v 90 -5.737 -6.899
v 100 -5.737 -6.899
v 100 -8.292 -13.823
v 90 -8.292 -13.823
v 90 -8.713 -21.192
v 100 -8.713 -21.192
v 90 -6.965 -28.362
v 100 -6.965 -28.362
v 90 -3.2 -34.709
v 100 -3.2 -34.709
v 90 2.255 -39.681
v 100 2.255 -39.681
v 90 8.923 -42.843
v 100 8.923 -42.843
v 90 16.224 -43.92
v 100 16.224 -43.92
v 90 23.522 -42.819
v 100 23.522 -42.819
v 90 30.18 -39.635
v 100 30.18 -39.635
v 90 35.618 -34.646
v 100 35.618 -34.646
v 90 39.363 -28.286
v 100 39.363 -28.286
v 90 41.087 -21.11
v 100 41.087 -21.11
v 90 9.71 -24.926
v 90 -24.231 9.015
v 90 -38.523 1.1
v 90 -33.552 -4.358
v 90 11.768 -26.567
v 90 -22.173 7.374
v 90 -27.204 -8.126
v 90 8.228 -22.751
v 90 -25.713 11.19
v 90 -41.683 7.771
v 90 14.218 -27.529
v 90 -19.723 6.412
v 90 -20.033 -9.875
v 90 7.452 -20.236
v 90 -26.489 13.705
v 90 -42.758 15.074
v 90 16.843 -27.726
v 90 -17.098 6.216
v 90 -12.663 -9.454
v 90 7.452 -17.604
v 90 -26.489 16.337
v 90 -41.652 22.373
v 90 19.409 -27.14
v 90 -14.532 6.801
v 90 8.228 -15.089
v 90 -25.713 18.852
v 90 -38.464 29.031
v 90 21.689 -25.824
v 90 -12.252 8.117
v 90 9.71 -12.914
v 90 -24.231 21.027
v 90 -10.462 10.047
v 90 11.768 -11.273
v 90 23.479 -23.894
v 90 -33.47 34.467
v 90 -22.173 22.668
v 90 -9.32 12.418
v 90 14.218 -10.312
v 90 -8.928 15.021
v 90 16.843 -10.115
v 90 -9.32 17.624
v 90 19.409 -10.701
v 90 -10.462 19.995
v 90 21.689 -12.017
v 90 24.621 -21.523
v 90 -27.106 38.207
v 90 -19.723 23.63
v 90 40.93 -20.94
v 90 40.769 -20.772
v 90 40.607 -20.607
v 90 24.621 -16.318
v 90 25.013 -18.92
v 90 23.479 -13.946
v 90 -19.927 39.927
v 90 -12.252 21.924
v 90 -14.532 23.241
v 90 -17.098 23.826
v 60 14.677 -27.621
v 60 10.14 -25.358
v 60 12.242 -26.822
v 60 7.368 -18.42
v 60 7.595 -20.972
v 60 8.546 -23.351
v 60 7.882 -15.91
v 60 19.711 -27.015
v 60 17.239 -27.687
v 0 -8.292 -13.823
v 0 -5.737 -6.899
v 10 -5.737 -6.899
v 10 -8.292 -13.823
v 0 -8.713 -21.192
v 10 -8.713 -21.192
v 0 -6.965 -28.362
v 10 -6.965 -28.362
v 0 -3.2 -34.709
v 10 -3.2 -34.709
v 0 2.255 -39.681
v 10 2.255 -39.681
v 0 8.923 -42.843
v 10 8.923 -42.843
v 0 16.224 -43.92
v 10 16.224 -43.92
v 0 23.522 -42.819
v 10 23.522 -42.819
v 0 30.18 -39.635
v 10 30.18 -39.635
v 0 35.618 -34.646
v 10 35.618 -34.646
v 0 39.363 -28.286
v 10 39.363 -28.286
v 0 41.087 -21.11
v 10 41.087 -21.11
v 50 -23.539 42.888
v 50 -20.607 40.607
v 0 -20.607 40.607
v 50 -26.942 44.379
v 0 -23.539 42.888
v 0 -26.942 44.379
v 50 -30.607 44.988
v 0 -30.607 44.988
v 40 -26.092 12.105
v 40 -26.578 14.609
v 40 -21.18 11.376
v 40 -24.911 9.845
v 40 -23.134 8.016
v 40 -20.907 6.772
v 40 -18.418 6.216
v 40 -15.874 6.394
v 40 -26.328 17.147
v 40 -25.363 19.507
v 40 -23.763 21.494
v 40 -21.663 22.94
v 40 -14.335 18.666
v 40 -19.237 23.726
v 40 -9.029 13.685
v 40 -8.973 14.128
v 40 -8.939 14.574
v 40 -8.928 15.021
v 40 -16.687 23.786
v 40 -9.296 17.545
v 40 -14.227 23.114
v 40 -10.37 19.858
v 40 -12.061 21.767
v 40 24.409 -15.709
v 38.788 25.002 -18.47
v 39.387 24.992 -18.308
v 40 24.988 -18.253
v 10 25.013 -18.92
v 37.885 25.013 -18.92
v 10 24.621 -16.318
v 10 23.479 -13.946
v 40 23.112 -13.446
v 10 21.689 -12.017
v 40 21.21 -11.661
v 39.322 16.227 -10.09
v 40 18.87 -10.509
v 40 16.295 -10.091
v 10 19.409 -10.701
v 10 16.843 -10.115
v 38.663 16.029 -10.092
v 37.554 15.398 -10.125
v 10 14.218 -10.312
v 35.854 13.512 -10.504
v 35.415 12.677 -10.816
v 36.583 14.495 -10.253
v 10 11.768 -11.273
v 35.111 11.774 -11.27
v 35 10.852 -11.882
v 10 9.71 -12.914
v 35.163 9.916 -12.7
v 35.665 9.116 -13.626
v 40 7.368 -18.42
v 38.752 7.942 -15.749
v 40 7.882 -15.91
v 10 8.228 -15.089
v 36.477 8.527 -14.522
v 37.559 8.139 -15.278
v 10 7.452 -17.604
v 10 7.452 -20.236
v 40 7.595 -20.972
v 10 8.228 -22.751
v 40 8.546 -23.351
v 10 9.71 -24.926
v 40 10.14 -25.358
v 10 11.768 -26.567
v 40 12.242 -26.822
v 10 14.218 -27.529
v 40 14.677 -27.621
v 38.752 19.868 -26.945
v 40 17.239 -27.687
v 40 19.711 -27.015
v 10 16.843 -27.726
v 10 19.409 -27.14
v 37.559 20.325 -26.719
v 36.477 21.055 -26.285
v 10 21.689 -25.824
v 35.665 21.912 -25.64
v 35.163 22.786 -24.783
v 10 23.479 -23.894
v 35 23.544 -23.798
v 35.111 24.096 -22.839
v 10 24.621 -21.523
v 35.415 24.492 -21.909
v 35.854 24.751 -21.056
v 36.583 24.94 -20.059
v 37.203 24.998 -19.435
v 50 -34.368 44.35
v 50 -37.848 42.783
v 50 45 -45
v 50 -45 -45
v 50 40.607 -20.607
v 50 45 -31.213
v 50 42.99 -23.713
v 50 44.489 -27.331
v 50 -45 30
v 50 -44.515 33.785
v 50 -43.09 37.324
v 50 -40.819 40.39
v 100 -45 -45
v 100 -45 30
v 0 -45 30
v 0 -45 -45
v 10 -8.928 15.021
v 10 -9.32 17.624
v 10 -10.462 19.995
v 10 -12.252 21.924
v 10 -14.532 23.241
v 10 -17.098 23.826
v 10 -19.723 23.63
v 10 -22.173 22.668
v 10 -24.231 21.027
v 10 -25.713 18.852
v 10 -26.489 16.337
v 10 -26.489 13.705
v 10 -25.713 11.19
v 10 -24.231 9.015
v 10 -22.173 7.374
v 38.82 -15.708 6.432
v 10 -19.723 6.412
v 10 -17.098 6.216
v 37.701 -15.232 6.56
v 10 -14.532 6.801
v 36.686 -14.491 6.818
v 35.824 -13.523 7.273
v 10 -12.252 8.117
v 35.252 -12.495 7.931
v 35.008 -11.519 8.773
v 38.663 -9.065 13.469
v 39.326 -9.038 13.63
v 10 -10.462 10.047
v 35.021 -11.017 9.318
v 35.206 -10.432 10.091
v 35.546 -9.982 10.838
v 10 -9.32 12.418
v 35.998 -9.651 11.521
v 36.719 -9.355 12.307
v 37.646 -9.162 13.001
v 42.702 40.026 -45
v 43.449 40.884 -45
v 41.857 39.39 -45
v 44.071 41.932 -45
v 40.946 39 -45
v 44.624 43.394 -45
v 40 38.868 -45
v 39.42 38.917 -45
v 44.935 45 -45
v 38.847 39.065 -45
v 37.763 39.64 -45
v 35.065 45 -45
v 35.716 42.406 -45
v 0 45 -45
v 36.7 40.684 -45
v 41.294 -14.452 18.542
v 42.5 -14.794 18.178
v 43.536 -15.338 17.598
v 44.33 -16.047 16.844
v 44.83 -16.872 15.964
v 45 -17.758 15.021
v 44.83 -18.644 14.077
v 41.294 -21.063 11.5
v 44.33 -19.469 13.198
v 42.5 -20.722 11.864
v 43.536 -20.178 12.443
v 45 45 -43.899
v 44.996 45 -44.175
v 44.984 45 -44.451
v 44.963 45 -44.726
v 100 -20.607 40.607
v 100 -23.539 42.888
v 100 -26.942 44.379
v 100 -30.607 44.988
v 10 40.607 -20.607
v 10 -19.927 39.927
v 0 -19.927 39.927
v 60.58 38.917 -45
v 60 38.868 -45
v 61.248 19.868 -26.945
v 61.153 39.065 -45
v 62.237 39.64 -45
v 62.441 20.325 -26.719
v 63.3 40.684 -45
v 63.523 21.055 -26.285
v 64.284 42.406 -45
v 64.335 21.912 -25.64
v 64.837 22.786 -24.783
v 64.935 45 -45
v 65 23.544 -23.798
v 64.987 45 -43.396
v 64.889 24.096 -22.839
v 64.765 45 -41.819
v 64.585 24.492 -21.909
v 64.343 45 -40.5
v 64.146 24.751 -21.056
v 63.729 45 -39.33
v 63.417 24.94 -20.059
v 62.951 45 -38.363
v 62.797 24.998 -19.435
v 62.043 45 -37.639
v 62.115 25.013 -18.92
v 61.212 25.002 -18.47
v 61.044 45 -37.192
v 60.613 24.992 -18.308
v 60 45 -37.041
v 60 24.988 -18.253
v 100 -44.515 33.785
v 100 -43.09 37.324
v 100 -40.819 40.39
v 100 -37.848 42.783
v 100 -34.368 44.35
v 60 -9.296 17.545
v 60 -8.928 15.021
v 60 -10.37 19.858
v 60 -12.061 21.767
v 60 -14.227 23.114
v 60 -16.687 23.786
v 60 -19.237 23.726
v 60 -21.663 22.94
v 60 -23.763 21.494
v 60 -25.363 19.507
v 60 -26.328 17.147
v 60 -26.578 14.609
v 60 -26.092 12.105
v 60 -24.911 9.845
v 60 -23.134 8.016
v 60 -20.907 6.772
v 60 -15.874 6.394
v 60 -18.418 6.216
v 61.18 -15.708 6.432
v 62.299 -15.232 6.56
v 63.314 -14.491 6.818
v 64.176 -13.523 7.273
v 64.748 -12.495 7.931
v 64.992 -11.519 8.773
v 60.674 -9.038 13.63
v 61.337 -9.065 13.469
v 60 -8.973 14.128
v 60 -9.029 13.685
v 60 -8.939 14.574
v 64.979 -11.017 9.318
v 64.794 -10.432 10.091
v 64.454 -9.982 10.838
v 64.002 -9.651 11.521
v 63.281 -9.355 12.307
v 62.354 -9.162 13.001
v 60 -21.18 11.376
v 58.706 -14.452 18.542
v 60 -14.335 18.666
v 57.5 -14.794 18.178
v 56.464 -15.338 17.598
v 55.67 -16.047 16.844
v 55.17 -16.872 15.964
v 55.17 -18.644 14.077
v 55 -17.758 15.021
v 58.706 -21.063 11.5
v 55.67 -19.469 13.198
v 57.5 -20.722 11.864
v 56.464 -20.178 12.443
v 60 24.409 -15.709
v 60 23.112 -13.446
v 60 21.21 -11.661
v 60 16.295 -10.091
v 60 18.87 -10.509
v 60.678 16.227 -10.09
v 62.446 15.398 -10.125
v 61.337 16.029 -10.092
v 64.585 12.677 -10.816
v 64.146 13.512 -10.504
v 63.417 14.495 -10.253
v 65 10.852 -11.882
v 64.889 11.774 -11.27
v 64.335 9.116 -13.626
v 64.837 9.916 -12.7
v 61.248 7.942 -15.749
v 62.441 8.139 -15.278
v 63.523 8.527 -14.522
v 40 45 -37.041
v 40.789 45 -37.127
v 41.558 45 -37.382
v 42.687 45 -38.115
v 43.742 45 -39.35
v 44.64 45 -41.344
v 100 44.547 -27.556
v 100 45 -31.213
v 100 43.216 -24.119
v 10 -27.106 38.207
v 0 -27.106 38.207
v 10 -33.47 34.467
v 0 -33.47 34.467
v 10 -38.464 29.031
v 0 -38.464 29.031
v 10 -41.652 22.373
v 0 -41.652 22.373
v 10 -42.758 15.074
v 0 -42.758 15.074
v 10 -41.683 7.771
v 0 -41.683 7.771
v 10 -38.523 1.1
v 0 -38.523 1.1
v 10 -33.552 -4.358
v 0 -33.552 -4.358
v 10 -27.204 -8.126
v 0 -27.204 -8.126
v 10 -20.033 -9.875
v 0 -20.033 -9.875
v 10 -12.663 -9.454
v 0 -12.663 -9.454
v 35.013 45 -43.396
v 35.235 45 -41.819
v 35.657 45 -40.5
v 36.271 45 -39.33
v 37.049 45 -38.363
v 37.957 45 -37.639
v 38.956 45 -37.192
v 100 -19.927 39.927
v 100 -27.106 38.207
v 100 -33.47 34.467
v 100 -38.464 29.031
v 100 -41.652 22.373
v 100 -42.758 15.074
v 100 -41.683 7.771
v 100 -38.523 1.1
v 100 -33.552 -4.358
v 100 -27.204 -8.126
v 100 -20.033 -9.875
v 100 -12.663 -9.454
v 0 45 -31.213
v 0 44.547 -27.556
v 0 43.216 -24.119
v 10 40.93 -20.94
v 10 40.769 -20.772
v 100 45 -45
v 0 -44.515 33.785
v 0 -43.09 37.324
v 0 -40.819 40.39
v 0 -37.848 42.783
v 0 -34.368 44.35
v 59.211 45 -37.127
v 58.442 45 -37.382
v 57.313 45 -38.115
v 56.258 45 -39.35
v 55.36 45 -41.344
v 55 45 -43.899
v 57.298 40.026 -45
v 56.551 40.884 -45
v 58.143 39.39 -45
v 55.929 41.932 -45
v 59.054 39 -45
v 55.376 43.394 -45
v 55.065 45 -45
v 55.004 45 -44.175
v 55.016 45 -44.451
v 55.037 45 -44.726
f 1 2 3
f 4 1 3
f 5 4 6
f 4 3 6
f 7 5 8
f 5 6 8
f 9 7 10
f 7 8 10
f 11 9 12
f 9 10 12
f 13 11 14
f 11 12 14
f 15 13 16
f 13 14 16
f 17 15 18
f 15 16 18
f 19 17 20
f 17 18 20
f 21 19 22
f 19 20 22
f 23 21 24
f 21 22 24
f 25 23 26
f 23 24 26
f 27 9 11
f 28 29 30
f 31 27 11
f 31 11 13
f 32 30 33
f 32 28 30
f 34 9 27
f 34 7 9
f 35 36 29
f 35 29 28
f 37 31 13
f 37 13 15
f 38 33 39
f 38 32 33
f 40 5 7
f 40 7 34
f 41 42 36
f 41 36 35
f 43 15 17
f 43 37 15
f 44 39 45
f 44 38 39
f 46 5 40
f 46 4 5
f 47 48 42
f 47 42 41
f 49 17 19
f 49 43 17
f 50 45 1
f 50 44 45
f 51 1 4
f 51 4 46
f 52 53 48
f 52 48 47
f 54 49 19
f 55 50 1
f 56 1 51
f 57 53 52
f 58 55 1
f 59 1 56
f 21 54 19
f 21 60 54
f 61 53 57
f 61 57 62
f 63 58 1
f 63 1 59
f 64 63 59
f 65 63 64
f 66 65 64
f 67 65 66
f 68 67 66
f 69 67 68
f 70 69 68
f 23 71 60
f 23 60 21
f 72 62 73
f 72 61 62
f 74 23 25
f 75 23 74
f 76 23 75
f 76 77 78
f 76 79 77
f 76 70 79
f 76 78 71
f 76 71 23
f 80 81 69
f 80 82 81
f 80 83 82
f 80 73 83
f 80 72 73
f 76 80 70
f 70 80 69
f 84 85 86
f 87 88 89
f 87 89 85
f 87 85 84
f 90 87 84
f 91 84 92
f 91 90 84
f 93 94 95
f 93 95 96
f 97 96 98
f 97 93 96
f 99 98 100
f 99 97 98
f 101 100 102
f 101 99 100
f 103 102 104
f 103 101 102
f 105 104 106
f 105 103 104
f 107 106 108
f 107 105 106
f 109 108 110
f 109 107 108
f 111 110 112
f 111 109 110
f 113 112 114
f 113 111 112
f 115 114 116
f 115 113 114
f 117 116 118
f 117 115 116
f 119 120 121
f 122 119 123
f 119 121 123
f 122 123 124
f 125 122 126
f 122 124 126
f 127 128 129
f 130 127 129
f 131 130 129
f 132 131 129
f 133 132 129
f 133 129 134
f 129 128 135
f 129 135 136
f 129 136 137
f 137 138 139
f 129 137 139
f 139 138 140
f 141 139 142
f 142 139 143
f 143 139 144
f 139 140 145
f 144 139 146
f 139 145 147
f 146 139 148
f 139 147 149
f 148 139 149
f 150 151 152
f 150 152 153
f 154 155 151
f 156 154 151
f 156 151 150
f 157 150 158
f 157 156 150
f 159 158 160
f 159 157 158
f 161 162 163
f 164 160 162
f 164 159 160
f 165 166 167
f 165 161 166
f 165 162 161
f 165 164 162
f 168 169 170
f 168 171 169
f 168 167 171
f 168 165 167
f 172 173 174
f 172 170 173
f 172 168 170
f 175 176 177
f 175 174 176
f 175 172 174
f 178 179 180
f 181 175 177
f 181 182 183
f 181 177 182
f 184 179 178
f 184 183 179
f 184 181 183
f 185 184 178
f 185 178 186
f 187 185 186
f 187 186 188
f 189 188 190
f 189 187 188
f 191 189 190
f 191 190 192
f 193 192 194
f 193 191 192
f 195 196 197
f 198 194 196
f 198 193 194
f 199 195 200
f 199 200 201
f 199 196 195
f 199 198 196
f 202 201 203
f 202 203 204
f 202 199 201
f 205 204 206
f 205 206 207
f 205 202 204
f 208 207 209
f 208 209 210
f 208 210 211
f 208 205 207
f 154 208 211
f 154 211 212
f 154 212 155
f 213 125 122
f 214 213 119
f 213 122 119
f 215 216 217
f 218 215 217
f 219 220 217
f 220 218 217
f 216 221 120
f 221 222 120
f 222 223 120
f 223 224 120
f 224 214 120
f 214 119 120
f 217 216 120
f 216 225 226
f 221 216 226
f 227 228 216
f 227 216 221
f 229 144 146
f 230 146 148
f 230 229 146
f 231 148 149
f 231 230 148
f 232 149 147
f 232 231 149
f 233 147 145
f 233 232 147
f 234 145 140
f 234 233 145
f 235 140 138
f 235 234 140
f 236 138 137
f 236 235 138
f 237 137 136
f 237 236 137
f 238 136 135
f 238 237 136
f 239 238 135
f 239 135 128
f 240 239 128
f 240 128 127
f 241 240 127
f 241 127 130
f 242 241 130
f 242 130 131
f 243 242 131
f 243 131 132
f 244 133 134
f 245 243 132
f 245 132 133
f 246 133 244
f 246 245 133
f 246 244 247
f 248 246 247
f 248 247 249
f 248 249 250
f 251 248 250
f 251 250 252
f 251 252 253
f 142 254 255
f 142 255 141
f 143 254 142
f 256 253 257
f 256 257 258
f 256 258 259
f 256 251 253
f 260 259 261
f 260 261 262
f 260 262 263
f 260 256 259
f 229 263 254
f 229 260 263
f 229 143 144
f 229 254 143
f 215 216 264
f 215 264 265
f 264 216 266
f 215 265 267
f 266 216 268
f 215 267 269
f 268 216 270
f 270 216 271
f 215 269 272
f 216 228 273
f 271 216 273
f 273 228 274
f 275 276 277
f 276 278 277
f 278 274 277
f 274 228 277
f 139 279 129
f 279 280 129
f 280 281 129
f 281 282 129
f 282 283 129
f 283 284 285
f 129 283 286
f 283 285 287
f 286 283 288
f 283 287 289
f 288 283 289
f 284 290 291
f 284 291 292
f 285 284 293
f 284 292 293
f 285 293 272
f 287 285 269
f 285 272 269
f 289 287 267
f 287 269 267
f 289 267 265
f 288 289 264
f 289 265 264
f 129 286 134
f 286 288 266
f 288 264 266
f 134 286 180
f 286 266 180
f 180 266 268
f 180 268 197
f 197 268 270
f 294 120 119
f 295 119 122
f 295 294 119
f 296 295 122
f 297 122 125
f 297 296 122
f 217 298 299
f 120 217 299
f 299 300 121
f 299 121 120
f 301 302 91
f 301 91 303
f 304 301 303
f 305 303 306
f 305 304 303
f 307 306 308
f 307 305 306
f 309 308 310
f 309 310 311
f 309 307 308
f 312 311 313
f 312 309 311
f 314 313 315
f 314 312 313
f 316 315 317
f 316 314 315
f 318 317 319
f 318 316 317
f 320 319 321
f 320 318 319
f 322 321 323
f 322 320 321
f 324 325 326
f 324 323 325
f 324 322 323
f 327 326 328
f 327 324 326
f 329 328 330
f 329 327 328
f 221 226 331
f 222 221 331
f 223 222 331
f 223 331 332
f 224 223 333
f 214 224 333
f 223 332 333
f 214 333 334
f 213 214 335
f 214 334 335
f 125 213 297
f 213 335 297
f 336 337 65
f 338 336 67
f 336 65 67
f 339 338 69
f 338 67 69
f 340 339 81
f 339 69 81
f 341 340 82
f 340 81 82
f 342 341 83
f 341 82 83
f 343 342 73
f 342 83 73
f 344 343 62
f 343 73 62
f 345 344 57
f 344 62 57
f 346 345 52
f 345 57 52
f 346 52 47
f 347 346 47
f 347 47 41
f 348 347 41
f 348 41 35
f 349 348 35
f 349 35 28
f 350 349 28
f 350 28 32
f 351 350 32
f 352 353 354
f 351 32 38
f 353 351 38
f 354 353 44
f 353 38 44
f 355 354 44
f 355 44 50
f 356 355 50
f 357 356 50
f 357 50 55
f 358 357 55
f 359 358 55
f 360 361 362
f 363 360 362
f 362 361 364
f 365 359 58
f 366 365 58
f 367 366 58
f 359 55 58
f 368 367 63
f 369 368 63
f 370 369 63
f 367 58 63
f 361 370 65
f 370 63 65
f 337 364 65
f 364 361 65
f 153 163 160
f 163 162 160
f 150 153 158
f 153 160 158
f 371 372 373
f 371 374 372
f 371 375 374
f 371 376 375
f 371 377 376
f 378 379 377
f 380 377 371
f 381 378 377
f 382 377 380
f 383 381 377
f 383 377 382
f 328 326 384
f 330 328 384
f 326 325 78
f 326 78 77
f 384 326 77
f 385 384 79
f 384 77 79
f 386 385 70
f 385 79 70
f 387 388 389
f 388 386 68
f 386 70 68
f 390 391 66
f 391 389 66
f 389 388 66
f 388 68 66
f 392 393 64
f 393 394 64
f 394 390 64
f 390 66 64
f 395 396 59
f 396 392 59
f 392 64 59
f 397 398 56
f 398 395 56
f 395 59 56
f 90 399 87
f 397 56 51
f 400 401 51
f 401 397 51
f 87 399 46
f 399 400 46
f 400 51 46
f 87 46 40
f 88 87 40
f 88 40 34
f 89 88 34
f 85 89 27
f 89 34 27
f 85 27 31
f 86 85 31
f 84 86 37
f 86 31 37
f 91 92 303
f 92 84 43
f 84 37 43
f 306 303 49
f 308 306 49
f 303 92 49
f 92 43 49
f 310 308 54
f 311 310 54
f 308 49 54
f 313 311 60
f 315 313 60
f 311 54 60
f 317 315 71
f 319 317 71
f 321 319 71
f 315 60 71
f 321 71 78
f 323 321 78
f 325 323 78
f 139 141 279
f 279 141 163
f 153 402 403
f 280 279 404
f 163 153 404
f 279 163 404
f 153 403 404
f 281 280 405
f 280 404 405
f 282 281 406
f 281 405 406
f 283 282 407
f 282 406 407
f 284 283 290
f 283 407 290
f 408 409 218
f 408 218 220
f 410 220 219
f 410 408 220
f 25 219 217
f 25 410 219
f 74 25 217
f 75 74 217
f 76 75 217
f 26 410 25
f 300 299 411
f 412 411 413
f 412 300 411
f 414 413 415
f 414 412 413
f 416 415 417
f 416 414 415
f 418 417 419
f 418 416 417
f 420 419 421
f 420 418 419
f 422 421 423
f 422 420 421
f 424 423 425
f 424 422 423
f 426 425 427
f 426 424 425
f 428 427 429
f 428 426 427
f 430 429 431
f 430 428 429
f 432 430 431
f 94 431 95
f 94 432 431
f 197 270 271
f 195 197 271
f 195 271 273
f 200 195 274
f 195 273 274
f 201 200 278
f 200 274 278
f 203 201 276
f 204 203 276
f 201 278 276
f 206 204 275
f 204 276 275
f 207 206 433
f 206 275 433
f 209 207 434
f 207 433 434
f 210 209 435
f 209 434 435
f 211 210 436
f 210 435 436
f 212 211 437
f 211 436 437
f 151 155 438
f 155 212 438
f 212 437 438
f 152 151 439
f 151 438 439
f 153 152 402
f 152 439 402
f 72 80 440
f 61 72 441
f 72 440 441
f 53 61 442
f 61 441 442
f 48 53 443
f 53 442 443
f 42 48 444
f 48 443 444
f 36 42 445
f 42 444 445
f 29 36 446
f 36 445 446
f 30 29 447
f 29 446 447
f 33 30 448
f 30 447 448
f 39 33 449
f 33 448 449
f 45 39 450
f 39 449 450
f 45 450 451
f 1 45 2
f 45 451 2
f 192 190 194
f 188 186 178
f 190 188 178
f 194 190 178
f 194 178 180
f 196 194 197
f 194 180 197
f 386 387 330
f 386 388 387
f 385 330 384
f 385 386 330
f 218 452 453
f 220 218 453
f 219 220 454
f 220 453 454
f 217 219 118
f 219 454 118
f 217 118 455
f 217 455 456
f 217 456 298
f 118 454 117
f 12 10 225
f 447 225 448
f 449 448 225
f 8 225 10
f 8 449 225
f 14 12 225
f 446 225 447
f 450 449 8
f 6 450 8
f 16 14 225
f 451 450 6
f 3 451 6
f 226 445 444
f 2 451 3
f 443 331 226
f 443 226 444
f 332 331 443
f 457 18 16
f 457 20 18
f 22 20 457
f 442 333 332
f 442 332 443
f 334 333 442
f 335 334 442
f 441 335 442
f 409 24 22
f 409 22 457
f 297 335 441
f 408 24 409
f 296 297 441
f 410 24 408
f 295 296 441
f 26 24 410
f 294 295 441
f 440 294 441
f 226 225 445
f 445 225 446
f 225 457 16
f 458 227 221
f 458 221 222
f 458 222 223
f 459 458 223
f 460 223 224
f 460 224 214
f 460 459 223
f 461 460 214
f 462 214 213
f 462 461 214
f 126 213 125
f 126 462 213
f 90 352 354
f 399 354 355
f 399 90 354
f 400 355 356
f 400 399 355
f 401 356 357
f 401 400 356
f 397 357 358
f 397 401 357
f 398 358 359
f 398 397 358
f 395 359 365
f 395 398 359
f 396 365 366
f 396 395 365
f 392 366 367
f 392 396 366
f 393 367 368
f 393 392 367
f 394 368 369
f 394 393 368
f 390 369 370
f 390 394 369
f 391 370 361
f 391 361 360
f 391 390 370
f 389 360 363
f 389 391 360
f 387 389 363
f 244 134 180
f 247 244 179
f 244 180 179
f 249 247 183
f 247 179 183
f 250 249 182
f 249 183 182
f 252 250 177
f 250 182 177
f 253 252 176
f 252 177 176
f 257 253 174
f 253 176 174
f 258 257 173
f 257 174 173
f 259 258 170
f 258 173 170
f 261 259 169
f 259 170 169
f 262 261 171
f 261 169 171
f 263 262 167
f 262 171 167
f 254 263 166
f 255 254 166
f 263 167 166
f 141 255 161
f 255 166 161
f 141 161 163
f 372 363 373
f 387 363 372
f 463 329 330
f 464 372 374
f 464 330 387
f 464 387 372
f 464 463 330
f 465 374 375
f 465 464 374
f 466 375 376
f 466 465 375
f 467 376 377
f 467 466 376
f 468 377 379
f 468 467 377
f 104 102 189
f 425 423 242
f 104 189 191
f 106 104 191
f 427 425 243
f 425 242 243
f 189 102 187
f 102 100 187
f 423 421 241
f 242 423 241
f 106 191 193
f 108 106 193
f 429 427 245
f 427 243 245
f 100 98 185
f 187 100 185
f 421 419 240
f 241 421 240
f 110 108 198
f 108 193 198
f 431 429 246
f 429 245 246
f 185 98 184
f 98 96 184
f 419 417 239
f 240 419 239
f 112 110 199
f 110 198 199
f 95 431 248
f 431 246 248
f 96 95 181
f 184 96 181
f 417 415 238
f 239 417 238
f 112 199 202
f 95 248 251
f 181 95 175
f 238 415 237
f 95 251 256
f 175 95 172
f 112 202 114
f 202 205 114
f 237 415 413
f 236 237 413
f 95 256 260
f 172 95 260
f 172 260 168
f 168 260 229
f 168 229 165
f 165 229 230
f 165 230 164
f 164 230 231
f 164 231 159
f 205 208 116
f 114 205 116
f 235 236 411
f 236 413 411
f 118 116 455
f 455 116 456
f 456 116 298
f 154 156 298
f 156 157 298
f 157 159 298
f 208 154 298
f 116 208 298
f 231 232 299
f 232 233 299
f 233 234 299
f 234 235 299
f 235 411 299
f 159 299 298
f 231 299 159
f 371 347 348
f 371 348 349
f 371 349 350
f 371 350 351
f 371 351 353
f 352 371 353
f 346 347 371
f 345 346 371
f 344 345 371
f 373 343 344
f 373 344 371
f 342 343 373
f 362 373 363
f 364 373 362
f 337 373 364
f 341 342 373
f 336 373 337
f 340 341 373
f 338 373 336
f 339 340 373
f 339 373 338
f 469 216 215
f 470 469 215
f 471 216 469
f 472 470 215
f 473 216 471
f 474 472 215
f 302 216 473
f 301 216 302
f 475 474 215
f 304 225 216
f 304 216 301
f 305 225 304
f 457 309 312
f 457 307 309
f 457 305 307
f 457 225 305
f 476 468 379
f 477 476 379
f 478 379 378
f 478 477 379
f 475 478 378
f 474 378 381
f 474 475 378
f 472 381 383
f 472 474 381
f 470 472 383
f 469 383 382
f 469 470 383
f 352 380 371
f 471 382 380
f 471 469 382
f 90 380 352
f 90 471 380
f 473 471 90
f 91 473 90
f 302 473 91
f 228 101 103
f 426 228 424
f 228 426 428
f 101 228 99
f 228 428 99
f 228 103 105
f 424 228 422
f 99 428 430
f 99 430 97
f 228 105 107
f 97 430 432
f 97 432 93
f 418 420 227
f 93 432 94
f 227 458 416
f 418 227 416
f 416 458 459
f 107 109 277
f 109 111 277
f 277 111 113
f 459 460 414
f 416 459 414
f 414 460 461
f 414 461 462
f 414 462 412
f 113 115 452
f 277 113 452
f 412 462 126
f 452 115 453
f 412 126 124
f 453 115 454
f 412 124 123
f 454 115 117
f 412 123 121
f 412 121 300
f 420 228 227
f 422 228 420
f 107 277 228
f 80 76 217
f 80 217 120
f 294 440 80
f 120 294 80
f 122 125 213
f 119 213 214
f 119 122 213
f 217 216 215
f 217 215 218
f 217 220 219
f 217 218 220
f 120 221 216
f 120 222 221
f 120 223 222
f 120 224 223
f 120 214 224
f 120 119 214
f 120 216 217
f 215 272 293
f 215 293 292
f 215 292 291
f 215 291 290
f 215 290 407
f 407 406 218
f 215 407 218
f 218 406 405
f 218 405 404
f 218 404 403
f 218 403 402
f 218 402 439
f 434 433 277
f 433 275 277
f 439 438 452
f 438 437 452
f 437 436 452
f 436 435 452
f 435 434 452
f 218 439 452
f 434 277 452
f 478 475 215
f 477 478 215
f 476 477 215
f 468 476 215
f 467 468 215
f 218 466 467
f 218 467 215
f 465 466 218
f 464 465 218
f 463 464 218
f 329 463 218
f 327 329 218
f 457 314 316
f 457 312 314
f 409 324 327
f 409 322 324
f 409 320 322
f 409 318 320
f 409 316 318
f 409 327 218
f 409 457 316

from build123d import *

# Parameters (mm, degrees)
F0_W        = 90
F0_H        = 90
F0_R        = 8.83
F1_DEPTH    = 50
F2_T1_DEPTH = 410.0356183152
F3_T1_DEPTH = 81.066017178
F3_T3_DEPTH = 125
F4_DEPTH    = 10
F6_DEPTH    = 10
F7_R        = 8.83
F8_DEPTH    = 10


# Not quite as in the source:
# - a fillet or chamfer that OpenCascade refuses, or shapes differently, is made with other operations: its cross-section is extruded or revolved along the edge and cut away or added


with BuildPart() as f1:
    # F0 (on Right) → F1 (new body)
    with BuildSketch(Plane.YZ):
        Rectangle(F0_W, F0_H)
        with BuildLine():
            ThreePointArc((-5.7369661858, -6.8994105845), (-39.269643101, 27.758238797), (7.242218534, 15.0208996323))
            ThreePointArc((7.242218534, 15.0208996323), (6.4600606697, 8.8163752919), (4.1625287508, 3.0000843521))
            ThreePointArc((4.1625287508, 3.0000843521), (28.9206831957, 2.5916357703), (41.1833440309, -18.9202258647))
            ThreePointArc((41.1833440309, -18.9202258647), (9.9788196906, -43.1380680004), (-5.7369661858, -6.8994105845))
        make_face(mode=Mode.SUBTRACT)
        with BuildLine():
            ThreePointArc((4.1625287508, 3.0000843521), (-0.0801119364, -2.6567698974), (-5.7369661858, -6.8994105845))
            ThreePointArc((-5.7369661858, -6.8994105845), (9.9788196906, -43.1380680004), (41.1833440309, -18.9202258647))
            ThreePointArc((41.1833440309, -18.9202258647), (28.9206831957, 2.5916357703), (4.1625287508, 3.0000843521))
        make_face()
        with Locations((16.1833440309, -18.9202258647)):
            Circle(F0_R, mode=Mode.SUBTRACT)
        with BuildLine():
            ThreePointArc((4.1625287508, 3.0000843521), (6.4600606697, 8.8163752919), (7.242218534, 15.0208996323))
            ThreePointArc((7.242218534, 15.0208996323), (-39.269643101, 27.758238797), (-5.7369661858, -6.8994105845))
            ThreePointArc((-5.7369661858, -6.8994105845), (-1.4943254987, -1.242556335), (4.1625287508, 3.0000843521))
        make_face()
        with Locations((-17.757781466, 15.0208996323)):
            Circle(F0_R, mode=Mode.SUBTRACT)
        with BuildLine():
            ThreePointArc((4.1625287508, 3.0000843521), (-1.4943254987, -1.242556335), (-5.7369661858, -6.8994105845))
            ThreePointArc((-5.7369661858, -6.8994105845), (-0.0801119364, -2.6567698974), (4.1625287508, 3.0000843521))
        make_face()
    extrude(amount=F1_DEPTH)

    # F2: chamfer of 70 on 1 edges, made by hand

    # F2_s2 → F2_t1 (cut)
    with BuildSketch(Plane.YZ.offset(-180.0178091576)):
        Polygon((45, -25), (-25, 45), (45, 45), align=None)
    extrude(amount=F2_T1_DEPTH, mode=Mode.SUBTRACT)

    # F3: fillet of radius 15 on 3 edges, made by hand

    # F3_s2 → F3_t1 (cut)
    with BuildSketch(Plane.YZ.offset(-15.533008589)):
        with BuildLine():
            ThreePointArc((45, -31.2132034356), (43.8581929877, -25.4729519501), (40.6066017178, -20.6066017178))
            Line((40.6066017178, -20.6066017178), (45, -25))
            Line((45, -25), (45, -31.2132034356))
        make_face()
        with BuildLine():
            ThreePointArc((-20.6066017178, 40.6066017178), (-25.4729519501, 43.8581929877), (-31.2132034356, 45))
            Line((-31.2132034356, 45), (-25, 45))
            Line((-25, 45), (-20.6066017178, 40.6066017178))
        make_face()
    extrude(amount=F3_T1_DEPTH, mode=Mode.SUBTRACT)

    # F3_s4 → F3_t3 (cut)
    with BuildSketch(Plane.YZ.offset(-37.5)):
        with BuildLine():
            ThreePointArc((-45, 30), (-40.6066017178, 40.6066017178), (-30, 45))
            Line((-30, 45), (-45, 45))
            Line((-45, 45), (-45, 30))
        make_face()
    extrude(amount=F3_T3_DEPTH, mode=Mode.SUBTRACT)

    # F0 (on Right) → F4 (cut)
    with BuildSketch(Plane.YZ):
        with BuildLine():
            ThreePointArc((4.1625287508, 3.0000843521), (6.4600606697, 8.8163752919), (7.242218534, 15.0208996323))
            ThreePointArc((7.242218534, 15.0208996323), (-39.269643101, 27.758238797), (-5.7369661858, -6.8994105845))
            ThreePointArc((-5.7369661858, -6.8994105845), (-1.4943254987, -1.242556335), (4.1625287508, 3.0000843521))
        make_face()
        with Locations((-17.757781466, 15.0208996323)):
            Circle(F0_R, mode=Mode.SUBTRACT)
        with BuildLine():
            ThreePointArc((4.1625287508, 3.0000843521), (-0.0801119364, -2.6567698974), (-5.7369661858, -6.8994105845))
            ThreePointArc((-5.7369661858, -6.8994105845), (9.9788196906, -43.1380680004), (41.1833440309, -18.9202258647))
            ThreePointArc((41.1833440309, -18.9202258647), (28.9206831957, 2.5916357703), (4.1625287508, 3.0000843521))
        make_face()
        with Locations((16.1833440309, -18.9202258647)):
            Circle(F0_R, mode=Mode.SUBTRACT)
        with BuildLine():
            ThreePointArc((4.1625287508, 3.0000843521), (-1.4943254987, -1.242556335), (-5.7369661858, -6.8994105845))
            ThreePointArc((-5.7369661858, -6.8994105845), (-0.0801119364, -2.6567698974), (4.1625287508, 3.0000843521))
        make_face()
    extrude(amount=F4_DEPTH, mode=Mode.SUBTRACT)

    # F5 (on face) → F6 (cut, through all)
    with BuildSketch(Plane.YZ):
        with BuildLine():
            ThreePointArc((4.1625287508, 3.0000843521), (8.9331762586, 5.0053894309), (14.014482738, 5.985517262))
            Line((14.014482738, 5.985517262), (7.1479616607, 12.8520383393))
            ThreePointArc((7.1479616607, 12.8520383393), (6.1678338296, 7.7707318599), (4.1625287508, 3.0000843521))
        make_face()
    extrude(amount=F6_DEPTH, mode=Mode.SUBTRACT)

    # F7 (on face) → F8 (join)
    with BuildSketch(Plane.YZ.offset(50)):
        with Locations((-17.757781466, 15.0208996323)):
            Circle(F7_R)
        with Locations((16.1833440309, -18.9202258647)):
            Circle(F7_R)
    extrude(amount=-F8_DEPTH)

    # F12: sweep along a path in F9
    with BuildLine(Plane(origin=(40, 0, 0), x_dir=(0, -1, 0), z_dir=(-1, 0, 0))) as f12_path:
        Line((17.757781466, 15.0208996323), (-52.1658341758, -50.6265266045))
    # F11 (on face) → F12 (sweep, cut)
    with BuildSketch(Plane(origin=(0, -10.4996791259, 9.8575696436), x_dir=(1, 0, 0), z_dir=(0, -0.7290478078, 0.6844627776))):
        with BuildLine():
            ThreePointArc((40, 3.796413521), (35, -1.203586479), (40, -6.203586479))
            Line((40, -6.203586479), (40, 3.796413521))
        make_face()
        with BuildLine():
            Line((40, 3.796413521), (40, -6.203586479))
            ThreePointArc((40, -6.203586479), (43.5355339059, -4.739120385), (45, -1.203586479))
            ThreePointArc((45, -1.203586479), (43.5355339059, 2.3319474269), (40, 3.796413521))
        make_face()
    sweep(path=f12_path.line, mode=Mode.SUBTRACT)


with BuildPart() as f13_1:
    # F13: instance of F1
    add(f1.part.mirror(Plane(origin=(50, -9.1492689096, -9.8684610313), x_dir=(0, 1, 0), z_dir=(1, 0, 0))))


solid = Compound([f1.part, f13_1.part])
